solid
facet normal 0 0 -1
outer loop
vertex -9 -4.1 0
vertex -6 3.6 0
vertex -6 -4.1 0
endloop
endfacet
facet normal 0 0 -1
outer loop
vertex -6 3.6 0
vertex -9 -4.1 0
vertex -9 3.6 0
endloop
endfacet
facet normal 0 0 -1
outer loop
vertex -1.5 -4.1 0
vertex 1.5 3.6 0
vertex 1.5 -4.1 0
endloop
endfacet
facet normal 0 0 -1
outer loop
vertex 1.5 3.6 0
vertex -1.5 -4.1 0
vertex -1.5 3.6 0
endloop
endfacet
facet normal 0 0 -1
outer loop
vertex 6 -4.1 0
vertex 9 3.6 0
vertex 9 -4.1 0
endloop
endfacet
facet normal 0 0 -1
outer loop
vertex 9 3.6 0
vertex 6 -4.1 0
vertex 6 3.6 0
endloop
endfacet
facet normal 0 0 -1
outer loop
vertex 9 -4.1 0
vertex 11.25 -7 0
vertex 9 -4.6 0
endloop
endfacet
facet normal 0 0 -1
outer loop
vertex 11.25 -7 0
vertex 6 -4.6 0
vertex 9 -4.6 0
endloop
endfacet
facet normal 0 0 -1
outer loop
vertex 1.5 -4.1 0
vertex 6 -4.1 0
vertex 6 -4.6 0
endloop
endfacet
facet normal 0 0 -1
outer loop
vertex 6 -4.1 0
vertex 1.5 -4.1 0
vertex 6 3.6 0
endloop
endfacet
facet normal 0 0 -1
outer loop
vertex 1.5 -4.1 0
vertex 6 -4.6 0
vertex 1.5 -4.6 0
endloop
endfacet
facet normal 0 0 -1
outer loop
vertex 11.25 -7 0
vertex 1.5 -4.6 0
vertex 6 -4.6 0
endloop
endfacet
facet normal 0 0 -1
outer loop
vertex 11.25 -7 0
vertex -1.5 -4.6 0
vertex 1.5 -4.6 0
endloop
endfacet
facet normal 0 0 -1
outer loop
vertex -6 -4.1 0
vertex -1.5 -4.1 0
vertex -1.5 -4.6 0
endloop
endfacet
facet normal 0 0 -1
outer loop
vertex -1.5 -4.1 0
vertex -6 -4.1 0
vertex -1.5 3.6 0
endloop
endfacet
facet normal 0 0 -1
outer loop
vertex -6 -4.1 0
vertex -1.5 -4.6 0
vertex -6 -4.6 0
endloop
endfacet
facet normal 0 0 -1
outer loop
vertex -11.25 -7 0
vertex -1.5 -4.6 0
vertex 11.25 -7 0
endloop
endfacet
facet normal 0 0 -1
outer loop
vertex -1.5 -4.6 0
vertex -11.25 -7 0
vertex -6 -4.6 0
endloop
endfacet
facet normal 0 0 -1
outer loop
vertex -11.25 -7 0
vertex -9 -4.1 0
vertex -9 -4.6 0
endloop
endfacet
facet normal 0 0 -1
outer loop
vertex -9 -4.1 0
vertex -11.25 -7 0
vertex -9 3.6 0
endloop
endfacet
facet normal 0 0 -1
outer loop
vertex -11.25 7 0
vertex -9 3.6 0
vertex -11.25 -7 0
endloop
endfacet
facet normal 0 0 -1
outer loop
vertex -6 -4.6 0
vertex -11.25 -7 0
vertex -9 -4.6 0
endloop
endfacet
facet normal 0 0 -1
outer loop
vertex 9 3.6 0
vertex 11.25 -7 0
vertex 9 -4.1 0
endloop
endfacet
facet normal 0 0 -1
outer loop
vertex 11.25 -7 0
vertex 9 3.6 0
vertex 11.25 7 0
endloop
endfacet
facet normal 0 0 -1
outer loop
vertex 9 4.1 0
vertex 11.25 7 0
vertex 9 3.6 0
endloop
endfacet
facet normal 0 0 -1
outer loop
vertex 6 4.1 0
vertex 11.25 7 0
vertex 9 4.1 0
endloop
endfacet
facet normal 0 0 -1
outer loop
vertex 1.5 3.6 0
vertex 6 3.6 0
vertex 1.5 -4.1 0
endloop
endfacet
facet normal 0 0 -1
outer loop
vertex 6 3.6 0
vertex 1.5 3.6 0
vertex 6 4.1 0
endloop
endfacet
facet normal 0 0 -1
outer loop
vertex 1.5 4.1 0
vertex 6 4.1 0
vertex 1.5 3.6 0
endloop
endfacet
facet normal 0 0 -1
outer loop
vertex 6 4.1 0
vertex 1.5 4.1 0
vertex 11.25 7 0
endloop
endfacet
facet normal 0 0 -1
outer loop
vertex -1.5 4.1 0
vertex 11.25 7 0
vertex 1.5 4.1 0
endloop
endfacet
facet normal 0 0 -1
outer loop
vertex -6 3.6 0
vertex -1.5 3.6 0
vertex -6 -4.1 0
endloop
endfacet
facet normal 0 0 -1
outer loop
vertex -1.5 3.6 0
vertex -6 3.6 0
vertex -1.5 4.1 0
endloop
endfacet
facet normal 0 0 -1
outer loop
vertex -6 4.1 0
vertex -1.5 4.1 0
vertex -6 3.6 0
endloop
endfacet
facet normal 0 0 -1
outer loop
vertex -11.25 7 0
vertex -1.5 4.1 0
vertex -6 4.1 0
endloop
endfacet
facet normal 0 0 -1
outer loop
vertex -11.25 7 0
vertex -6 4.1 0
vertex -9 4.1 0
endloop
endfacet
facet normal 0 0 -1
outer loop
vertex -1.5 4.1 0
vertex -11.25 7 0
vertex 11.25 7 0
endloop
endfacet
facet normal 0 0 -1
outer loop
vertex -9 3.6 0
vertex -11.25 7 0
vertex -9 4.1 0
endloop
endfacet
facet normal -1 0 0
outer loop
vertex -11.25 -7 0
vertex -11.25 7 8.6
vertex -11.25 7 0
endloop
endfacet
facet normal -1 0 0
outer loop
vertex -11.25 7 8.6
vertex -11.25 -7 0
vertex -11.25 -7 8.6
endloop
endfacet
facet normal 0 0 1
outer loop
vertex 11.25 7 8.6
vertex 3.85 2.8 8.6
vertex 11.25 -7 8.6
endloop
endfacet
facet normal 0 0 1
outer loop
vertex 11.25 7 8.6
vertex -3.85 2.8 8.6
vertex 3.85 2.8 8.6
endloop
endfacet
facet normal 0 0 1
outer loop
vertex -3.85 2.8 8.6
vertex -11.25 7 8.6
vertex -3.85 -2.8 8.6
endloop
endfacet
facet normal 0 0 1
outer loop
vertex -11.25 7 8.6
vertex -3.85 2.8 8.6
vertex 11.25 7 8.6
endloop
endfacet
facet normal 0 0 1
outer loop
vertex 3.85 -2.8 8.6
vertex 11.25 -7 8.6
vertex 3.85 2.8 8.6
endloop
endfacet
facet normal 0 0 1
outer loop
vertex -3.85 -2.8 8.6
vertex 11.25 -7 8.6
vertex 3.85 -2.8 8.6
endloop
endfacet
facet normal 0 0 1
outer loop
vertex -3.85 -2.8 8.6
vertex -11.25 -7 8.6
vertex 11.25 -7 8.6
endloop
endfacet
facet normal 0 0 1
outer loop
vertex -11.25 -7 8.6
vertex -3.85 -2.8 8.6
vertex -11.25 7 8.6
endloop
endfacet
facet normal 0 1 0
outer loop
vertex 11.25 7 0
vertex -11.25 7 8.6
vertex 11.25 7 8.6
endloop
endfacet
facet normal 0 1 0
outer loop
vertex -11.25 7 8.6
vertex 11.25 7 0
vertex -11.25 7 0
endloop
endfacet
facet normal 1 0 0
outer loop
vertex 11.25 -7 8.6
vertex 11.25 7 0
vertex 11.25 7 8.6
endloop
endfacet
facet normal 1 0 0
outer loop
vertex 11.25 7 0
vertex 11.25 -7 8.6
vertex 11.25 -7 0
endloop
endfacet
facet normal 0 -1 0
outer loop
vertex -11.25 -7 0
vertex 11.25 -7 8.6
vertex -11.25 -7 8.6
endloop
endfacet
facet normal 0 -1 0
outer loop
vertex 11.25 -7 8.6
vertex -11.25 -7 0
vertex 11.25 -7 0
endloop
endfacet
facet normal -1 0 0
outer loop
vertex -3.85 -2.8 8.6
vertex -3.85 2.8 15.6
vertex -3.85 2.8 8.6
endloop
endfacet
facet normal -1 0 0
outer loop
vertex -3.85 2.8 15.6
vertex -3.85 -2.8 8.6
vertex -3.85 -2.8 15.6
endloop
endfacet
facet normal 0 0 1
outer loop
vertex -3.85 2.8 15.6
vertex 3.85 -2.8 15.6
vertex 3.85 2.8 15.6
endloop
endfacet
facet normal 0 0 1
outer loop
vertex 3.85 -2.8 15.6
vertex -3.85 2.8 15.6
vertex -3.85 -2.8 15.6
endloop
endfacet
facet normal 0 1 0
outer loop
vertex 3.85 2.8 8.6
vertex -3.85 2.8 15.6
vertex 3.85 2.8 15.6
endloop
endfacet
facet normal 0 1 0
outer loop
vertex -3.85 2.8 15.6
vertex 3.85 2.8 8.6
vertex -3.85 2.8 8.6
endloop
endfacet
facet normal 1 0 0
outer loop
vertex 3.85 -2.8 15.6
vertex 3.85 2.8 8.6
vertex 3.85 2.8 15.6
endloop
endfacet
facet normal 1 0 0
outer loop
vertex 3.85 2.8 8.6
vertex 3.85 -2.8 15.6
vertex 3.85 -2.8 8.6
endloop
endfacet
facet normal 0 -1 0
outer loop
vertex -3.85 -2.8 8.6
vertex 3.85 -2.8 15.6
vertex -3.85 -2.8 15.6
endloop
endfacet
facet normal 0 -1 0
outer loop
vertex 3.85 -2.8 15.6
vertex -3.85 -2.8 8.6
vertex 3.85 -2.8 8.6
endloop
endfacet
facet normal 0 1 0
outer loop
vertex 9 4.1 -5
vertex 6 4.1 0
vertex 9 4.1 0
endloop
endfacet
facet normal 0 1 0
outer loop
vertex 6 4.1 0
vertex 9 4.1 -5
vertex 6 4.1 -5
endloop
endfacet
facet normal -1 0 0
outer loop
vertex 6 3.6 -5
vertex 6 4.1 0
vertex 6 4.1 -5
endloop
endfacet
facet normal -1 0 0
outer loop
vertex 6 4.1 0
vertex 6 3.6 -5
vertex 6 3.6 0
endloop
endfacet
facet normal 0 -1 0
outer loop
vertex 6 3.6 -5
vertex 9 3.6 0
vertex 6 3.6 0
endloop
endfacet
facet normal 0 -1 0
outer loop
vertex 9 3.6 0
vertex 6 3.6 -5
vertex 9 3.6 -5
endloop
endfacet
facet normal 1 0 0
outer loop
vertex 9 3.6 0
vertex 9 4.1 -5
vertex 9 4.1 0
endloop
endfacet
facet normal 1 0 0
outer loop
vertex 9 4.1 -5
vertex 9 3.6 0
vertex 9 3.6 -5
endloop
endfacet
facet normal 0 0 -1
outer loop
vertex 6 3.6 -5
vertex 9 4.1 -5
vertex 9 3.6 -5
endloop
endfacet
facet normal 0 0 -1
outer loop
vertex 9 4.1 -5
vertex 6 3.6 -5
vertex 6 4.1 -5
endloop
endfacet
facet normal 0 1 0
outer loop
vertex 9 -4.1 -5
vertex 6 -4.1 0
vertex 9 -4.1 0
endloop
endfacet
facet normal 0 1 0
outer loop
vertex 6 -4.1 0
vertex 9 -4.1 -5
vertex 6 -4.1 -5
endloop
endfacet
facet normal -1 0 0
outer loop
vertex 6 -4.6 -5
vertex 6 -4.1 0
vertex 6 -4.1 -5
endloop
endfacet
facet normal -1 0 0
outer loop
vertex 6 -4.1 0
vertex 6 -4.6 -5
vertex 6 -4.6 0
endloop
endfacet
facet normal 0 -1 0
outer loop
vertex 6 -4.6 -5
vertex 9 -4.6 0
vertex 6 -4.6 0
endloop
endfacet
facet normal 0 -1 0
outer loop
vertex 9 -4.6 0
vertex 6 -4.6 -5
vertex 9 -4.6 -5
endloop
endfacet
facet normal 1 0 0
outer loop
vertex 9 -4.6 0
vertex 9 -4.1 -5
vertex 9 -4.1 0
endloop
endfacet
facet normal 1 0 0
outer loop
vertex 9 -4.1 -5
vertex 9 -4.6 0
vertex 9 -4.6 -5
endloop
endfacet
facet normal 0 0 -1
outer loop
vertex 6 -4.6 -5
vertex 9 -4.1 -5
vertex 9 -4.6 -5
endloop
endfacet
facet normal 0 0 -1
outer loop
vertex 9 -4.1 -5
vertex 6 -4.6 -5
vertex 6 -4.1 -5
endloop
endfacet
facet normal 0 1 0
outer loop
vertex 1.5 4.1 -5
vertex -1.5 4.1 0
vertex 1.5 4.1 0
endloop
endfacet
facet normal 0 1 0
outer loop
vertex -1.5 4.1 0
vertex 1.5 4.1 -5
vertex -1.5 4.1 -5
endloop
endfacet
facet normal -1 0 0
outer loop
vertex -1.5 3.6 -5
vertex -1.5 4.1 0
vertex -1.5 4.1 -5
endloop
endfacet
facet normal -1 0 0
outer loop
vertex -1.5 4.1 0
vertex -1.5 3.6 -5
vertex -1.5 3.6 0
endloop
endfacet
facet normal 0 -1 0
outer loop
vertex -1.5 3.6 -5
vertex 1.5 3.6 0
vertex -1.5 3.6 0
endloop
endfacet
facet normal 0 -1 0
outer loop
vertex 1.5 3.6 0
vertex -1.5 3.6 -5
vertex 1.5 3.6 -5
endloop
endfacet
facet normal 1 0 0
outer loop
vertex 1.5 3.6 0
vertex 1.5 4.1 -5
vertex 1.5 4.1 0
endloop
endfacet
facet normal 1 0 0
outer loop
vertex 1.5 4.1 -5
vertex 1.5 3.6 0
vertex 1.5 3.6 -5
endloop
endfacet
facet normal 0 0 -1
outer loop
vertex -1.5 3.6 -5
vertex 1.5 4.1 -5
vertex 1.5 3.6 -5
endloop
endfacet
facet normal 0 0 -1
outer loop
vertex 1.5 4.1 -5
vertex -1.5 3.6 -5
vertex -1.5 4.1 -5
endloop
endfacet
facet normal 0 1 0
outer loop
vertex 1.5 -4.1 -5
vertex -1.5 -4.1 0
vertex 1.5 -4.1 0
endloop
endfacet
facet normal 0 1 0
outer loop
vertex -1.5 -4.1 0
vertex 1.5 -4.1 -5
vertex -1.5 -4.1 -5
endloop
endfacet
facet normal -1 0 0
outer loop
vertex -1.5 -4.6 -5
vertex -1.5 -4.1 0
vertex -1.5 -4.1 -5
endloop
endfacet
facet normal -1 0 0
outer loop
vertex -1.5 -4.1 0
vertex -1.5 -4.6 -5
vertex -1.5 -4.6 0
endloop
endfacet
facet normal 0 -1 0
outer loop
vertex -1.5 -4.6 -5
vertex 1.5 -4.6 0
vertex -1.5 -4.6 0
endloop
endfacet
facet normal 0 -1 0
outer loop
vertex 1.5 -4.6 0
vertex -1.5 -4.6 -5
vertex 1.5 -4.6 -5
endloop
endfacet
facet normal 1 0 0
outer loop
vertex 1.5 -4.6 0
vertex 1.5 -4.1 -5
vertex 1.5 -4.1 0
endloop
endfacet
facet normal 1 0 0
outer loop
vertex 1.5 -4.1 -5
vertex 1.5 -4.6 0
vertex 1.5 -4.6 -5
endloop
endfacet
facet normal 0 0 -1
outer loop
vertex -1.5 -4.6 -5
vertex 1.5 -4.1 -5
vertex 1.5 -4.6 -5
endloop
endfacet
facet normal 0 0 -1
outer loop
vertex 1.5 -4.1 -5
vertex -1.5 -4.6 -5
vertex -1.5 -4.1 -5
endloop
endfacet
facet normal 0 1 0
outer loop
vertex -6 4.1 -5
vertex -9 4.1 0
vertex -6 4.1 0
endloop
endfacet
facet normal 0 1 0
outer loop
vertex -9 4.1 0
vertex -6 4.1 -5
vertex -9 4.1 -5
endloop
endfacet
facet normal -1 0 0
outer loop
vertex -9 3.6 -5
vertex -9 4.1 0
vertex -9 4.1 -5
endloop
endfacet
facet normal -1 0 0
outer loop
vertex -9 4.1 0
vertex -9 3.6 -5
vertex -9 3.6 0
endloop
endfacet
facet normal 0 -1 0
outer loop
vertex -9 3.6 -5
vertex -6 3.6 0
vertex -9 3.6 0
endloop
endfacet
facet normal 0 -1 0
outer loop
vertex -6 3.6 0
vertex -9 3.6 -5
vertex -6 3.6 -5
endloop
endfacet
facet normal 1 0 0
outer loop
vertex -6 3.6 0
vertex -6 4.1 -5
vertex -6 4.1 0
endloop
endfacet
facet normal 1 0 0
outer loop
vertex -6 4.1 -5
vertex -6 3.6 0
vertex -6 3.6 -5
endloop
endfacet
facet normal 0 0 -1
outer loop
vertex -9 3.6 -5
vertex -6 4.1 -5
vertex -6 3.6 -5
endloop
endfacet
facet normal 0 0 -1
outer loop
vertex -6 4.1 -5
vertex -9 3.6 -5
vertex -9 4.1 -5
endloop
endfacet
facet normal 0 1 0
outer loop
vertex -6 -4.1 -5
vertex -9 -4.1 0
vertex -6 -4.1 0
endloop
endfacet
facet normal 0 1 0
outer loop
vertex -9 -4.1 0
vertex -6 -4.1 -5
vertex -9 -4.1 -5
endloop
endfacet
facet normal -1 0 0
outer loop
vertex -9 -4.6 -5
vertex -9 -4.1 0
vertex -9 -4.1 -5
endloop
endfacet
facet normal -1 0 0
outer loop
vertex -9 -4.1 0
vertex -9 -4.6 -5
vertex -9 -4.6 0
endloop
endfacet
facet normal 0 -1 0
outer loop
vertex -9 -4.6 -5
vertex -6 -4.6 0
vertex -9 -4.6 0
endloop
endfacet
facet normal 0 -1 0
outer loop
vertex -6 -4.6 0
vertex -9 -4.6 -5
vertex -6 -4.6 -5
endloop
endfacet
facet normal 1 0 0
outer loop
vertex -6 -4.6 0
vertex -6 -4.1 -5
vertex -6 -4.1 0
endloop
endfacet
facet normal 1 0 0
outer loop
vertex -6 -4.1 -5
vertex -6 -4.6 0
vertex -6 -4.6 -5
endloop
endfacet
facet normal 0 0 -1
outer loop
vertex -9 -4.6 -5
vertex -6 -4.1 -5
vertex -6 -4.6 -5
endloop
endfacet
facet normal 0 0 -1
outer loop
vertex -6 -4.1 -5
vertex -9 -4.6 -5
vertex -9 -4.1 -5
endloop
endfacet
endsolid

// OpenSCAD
linear_extrude(8.6) square([22.5,14], center= true);

translate([0,0,8.6]) linear_extrude(7) square([7.7,5.6], center=true);

rotate([90,0,0]) translate([7.5,-2.5,-4.1]) linear_extrude(0.5) square([3,5], center=true);

rotate([90,0,0]) translate([7.5,-2.5,4.1]) linear_extrude(0.5) square([3,5], center=true);


rotate([90,0,0]) translate([0,-2.5,-4.1]) linear_extrude(0.5) square([3,5], center=true);

rotate([90,0,0]) translate([0,-2.5,4.1]) linear_extrude(0.5) square([3,5], center=true);

rotate([90,0,0]) translate([-7.5,-2.5,-4.1]) linear_extrude(0.5) square([3,5], center=true);

rotate([90,0,0]) translate([-7.5,-2.5,4.1]) linear_extrude(0.5) square([3,5], center=true);
